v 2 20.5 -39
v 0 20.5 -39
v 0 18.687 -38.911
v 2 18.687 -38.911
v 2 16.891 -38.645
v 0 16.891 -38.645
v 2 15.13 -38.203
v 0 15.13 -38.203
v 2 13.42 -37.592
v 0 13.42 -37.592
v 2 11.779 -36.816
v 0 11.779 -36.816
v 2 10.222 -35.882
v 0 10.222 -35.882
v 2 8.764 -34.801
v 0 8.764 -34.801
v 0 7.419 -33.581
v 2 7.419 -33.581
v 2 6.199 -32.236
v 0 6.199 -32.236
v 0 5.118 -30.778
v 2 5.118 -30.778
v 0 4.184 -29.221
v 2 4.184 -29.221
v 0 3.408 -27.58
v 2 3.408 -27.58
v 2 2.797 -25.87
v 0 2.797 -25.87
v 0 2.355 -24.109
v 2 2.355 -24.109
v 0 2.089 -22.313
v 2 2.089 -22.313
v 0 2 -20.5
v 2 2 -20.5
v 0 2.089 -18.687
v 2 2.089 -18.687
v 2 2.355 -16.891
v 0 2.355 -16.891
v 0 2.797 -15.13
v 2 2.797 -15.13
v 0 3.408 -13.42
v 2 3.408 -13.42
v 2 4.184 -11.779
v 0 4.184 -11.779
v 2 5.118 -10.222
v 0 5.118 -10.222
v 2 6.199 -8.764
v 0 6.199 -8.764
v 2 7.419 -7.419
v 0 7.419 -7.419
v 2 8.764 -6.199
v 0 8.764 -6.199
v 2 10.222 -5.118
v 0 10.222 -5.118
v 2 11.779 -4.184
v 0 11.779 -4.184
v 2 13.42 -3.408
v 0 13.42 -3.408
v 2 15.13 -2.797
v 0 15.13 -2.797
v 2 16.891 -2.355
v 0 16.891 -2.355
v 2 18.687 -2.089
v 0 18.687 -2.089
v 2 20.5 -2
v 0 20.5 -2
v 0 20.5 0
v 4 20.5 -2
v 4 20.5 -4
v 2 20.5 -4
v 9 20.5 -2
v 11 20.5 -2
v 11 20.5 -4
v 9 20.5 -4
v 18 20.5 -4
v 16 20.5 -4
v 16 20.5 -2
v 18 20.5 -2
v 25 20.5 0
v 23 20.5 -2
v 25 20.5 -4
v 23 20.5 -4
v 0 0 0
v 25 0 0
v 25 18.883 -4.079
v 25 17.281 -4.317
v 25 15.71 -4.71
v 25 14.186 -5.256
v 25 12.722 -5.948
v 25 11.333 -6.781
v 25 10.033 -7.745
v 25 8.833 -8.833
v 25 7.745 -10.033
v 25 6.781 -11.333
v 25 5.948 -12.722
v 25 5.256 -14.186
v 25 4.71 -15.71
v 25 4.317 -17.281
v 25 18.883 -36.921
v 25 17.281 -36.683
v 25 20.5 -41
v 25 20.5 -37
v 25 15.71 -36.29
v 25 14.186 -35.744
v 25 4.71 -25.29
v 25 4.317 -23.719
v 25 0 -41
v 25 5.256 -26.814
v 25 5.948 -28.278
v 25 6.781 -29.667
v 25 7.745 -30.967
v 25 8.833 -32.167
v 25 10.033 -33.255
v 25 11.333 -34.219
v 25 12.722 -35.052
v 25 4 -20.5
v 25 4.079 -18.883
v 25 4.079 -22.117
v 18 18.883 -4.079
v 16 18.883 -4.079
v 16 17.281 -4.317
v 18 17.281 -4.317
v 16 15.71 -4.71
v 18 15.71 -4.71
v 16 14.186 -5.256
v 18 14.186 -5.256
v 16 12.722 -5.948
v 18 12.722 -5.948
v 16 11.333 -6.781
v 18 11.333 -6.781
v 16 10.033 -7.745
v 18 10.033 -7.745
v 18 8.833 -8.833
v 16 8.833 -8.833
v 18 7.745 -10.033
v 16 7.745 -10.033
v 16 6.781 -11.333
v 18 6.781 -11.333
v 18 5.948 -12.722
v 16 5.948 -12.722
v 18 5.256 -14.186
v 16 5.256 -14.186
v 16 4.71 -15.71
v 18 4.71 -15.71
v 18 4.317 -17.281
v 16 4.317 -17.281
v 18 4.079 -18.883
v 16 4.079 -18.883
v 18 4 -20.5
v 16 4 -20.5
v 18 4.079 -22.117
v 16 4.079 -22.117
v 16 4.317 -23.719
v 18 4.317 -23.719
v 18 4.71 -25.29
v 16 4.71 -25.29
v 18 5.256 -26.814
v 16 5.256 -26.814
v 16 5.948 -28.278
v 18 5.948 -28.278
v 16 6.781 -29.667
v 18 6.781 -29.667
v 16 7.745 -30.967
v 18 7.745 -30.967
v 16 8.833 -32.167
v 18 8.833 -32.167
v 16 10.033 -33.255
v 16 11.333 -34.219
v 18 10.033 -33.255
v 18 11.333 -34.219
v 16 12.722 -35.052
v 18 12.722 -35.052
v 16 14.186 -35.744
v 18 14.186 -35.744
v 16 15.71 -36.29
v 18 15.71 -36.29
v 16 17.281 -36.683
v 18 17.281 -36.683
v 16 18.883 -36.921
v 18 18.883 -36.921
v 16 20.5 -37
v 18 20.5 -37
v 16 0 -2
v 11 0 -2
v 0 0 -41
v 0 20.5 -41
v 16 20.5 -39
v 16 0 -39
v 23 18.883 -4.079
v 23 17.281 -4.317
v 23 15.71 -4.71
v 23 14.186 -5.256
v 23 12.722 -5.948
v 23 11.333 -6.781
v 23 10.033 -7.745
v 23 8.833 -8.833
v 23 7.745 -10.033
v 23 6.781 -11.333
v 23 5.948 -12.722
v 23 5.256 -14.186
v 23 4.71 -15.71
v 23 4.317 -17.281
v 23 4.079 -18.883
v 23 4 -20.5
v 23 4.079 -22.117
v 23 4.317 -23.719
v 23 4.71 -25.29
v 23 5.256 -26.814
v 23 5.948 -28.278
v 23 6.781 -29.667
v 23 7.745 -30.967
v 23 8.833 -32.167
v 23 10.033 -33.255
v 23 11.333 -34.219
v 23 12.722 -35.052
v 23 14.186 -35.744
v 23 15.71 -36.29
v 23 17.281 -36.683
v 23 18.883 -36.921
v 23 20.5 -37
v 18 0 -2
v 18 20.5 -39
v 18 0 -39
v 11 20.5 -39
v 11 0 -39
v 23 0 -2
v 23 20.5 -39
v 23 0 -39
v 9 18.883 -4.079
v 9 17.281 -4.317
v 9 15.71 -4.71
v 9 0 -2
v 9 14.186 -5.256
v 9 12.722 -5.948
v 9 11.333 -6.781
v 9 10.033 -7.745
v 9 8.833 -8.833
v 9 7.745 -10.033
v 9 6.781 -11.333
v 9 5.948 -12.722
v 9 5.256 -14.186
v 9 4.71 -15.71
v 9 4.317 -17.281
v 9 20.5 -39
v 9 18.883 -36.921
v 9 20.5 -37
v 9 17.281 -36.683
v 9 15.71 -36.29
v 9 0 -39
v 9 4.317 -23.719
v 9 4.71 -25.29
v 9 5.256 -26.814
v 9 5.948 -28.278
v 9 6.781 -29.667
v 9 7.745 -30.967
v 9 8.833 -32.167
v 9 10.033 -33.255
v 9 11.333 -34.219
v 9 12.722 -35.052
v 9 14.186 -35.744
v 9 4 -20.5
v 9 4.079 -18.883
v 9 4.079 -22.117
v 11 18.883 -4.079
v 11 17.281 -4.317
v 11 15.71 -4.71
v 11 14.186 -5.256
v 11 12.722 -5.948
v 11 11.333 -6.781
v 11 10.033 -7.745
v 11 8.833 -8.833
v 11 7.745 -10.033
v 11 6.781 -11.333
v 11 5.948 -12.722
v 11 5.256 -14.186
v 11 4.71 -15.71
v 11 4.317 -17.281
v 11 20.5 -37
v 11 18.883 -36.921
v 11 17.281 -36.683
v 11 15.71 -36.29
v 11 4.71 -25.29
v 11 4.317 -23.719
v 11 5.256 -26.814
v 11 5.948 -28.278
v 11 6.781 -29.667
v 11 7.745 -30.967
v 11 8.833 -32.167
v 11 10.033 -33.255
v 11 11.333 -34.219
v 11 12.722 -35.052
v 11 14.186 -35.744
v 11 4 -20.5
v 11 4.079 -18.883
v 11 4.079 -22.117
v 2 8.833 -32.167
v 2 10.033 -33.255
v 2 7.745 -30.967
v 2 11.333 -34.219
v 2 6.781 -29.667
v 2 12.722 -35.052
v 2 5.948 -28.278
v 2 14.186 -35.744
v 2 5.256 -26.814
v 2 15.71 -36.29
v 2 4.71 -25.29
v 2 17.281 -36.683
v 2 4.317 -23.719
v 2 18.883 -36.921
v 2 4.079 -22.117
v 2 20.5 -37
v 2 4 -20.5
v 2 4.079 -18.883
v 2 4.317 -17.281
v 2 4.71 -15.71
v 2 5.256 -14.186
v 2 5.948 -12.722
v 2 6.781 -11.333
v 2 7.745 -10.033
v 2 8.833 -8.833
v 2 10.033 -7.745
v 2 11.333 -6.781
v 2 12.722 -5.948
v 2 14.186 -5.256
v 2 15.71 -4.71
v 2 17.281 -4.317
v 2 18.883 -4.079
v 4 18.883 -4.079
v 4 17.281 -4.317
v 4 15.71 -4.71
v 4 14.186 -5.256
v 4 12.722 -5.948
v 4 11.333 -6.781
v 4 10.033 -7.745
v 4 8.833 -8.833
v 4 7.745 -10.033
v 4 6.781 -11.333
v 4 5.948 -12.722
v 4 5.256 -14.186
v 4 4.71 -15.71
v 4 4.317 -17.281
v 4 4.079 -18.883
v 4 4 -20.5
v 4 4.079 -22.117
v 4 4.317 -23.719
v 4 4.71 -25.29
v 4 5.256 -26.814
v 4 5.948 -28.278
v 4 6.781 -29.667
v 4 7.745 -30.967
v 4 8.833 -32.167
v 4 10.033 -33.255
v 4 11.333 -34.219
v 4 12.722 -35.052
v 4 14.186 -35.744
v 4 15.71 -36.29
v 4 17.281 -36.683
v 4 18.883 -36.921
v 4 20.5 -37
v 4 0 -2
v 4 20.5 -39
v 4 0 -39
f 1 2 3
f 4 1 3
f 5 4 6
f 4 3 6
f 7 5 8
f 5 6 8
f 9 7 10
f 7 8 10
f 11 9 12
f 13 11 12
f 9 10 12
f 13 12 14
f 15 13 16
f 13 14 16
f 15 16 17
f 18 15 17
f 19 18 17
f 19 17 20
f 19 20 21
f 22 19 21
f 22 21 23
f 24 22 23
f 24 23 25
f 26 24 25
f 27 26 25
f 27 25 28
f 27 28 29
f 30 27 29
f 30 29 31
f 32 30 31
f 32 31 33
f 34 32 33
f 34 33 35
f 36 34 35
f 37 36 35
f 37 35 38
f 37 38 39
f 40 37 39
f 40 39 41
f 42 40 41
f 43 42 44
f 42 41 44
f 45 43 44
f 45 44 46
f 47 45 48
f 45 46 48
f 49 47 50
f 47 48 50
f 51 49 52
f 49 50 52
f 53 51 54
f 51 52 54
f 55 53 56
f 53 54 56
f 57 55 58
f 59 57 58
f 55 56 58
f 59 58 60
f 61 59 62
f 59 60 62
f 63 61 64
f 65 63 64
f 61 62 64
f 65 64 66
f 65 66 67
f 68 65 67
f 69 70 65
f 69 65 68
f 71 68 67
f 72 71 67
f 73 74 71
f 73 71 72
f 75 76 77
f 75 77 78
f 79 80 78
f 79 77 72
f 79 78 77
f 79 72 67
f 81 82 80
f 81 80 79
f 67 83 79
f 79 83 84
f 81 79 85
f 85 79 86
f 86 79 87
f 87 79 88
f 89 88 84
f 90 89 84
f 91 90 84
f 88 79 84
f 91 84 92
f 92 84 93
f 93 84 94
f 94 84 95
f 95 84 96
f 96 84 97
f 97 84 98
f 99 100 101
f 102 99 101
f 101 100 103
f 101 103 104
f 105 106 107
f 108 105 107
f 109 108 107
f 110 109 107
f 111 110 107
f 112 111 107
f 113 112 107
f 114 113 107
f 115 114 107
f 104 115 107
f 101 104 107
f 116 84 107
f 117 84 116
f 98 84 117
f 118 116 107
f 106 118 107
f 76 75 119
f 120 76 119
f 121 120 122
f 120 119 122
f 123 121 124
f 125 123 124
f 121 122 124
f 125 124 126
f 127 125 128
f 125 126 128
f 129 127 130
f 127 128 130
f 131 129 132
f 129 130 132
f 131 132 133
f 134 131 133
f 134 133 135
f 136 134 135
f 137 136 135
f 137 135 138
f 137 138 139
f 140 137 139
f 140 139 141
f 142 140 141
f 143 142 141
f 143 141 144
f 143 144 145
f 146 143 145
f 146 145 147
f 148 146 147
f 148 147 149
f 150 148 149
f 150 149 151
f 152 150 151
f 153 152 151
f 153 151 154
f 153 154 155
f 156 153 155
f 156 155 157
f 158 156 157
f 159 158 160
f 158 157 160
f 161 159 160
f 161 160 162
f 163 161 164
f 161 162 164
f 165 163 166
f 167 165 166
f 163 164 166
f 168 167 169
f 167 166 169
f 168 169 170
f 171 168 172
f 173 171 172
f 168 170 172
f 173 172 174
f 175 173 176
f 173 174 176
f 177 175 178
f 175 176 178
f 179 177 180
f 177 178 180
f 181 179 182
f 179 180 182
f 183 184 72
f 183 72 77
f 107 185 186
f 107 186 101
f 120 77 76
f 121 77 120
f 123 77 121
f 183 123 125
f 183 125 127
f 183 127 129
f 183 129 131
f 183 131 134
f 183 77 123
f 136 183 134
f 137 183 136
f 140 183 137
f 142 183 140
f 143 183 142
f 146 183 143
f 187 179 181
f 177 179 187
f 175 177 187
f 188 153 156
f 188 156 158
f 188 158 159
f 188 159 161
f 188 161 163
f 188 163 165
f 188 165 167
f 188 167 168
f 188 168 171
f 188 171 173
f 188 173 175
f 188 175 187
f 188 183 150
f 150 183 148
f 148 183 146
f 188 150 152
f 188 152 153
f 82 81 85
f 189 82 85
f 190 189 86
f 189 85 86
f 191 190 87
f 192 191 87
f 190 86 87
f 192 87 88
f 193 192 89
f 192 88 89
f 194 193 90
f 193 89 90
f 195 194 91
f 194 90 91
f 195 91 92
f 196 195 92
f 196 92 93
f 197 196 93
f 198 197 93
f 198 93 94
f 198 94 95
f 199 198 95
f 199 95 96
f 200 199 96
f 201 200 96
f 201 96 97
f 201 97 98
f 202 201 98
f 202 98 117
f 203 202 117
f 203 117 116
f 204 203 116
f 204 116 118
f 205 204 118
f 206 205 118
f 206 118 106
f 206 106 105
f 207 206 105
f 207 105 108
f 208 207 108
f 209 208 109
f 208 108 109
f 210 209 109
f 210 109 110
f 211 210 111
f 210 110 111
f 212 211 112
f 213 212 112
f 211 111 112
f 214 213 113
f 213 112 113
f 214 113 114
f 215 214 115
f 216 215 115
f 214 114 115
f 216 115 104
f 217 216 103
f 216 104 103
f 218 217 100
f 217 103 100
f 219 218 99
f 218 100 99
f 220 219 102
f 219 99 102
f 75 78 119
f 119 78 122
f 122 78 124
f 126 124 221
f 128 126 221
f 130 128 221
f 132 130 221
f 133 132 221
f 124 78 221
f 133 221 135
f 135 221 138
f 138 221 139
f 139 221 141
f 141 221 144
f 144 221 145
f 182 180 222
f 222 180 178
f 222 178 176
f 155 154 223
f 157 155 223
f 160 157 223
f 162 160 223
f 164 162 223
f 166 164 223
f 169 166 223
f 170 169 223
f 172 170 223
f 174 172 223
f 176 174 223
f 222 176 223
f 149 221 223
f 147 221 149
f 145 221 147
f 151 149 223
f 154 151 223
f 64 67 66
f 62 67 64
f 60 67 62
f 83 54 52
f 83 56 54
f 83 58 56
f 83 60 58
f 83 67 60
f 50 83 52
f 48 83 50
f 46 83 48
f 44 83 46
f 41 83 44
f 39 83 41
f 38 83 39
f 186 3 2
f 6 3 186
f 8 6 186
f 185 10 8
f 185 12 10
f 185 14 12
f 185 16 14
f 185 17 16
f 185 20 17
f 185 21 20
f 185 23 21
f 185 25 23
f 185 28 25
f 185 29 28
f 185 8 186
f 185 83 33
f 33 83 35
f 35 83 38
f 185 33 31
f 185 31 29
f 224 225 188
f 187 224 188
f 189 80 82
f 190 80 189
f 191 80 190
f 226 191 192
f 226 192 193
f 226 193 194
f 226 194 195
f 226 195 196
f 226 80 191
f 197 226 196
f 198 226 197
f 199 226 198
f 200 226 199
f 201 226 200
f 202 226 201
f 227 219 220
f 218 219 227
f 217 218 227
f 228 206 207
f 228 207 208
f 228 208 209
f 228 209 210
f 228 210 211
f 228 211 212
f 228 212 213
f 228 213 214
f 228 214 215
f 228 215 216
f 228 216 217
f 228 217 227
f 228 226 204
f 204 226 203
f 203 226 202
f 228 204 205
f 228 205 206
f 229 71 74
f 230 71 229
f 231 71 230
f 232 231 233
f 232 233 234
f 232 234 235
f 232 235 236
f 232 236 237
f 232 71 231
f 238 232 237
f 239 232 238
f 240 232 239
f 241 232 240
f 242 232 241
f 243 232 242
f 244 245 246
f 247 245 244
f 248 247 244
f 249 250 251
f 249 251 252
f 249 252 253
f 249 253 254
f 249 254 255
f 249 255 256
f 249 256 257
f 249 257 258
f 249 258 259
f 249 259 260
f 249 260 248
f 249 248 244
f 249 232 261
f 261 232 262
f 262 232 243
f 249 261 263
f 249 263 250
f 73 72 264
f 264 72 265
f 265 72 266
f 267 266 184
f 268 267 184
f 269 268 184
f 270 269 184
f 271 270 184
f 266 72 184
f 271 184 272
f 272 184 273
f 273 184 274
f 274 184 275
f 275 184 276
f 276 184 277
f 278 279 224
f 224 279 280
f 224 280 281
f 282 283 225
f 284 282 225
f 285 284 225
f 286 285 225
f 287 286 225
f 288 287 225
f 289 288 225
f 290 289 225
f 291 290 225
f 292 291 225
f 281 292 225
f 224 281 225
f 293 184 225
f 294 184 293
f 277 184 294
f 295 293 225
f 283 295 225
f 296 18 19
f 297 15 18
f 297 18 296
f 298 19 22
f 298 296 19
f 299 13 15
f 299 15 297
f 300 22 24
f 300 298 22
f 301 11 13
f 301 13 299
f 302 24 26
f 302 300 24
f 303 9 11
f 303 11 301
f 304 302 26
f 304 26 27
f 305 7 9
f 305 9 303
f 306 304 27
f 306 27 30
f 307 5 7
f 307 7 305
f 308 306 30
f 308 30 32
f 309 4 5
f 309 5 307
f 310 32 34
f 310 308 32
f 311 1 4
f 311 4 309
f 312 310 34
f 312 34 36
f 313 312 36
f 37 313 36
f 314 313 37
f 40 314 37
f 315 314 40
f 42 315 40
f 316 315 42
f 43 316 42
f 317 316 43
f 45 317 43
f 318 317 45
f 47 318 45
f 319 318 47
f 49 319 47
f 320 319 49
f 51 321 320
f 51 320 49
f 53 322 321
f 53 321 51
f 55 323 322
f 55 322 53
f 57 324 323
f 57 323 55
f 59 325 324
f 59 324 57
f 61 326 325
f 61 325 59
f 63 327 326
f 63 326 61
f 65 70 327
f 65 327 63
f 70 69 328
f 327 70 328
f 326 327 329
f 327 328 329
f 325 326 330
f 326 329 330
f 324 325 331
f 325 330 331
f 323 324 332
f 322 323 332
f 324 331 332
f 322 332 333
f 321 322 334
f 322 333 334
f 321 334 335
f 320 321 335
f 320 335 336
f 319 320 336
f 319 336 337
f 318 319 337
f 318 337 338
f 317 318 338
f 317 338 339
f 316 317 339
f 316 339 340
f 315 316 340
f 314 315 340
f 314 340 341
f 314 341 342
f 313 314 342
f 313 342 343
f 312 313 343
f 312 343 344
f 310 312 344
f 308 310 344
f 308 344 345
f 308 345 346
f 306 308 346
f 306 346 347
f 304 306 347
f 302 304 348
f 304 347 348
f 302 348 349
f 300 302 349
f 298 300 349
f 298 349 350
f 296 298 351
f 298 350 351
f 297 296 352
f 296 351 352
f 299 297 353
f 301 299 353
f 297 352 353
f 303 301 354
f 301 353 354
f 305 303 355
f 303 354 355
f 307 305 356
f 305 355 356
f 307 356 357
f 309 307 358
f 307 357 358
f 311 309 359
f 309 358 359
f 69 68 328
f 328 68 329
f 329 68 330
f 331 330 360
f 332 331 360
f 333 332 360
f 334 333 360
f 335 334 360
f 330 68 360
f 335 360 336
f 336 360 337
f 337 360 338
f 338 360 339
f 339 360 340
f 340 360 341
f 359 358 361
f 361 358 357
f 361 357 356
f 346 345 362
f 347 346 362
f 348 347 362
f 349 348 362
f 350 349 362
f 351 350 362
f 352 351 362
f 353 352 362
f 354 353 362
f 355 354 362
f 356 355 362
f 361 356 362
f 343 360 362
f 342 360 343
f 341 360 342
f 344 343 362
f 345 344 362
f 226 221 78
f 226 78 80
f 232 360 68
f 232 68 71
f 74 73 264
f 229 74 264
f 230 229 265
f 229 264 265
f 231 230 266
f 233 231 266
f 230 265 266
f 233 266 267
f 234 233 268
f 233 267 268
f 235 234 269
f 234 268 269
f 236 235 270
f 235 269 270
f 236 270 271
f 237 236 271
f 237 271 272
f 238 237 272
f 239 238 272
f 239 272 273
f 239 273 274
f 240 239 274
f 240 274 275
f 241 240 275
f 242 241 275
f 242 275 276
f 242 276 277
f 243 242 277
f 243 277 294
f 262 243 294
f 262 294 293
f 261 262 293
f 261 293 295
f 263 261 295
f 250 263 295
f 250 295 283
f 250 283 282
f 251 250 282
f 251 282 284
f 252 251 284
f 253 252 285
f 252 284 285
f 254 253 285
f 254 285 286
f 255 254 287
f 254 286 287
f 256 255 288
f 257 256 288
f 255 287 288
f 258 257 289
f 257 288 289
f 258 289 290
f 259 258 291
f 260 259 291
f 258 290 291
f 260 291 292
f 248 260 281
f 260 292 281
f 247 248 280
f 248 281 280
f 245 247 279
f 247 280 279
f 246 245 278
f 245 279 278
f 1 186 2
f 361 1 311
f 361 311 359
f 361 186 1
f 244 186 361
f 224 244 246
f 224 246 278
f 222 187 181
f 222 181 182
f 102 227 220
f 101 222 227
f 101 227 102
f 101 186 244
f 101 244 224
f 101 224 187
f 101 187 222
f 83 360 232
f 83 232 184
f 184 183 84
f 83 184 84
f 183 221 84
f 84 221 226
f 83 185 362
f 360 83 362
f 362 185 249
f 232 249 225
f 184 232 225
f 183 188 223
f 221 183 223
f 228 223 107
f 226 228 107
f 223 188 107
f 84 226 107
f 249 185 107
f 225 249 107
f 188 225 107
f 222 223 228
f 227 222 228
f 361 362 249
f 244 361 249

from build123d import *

# Parameters (mm, degrees)
SKETCH_1_W             = 25
SKETCH_1_H             = 41
EXTRUDE_415_DEPTH      = 2
SKETCH_5_W             = 25
SKETCH_5_H             = 2
EXTRUDE_624_DEPTH      = 18.5
SKETCH_7_W             = 4
SKETCH_7_H             = 37
SKETCH_7_W_2           = 2
EXTRUDE_1265_DEPTH     = 18.5
SKETCH_8_R             = 18.5
CUT_EXTRUDE_1405_DEPTH = 2
SKETCH_9_R             = 16.5
CUT_EXTRUDE_1536_DEPTH = 23
SKETCH_10_W            = 5
SKETCH_10_H            = 37
CUT_EXTRUDE_1762_DEPTH = 2


with BuildPart() as part:
    # 草图1 → Extrude 415 (new body)
    with BuildSketch(Plane(origin=(0, 0, 0), x_dir=(1, 0, 0), z_dir=(0, 1, 0))):
        with Locations((12.5, 20.5)):
            Rectangle(SKETCH_1_W, SKETCH_1_H)
    extrude(amount=EXTRUDE_415_DEPTH)

    # 草图5 → Extrude 624 (add)
    with BuildSketch(Plane(origin=(0, 2, 0), x_dir=(1, 0, 0), z_dir=(0, 1, 0))):
        with Locations((12.5, 40)):
            Rectangle(SKETCH_5_W, SKETCH_5_H)
        with Locations((12.5, 1)):
            Rectangle(SKETCH_5_W, SKETCH_5_H)
    extrude(amount=EXTRUDE_624_DEPTH)

    # 草图7 → Extrude 1265 (add)
    with BuildSketch(Plane(origin=(0, 2, 0), x_dir=(1, 0, 0), z_dir=(0, 1, 0))):
        with Locations((2, 20.5)):
            Rectangle(SKETCH_7_W, SKETCH_7_H)
        with Locations((10, 20.5)):
            Rectangle(SKETCH_7_W_2, SKETCH_7_H)
        with Locations((17, 20.5)):
            Rectangle(SKETCH_7_W_2, SKETCH_7_H)
        with Locations((24, 20.5)):
            Rectangle(SKETCH_7_W_2, SKETCH_7_H)
    extrude(amount=EXTRUDE_1265_DEPTH)

    # 草图8 → Cut-Extrude 1405 (cut)
    with BuildSketch(Plane.ZY):
        with Locations((-20.5, 20.5)):
            Circle(SKETCH_8_R)
    extrude(amount=-CUT_EXTRUDE_1405_DEPTH, mode=Mode.SUBTRACT)

    # 草图9 → Cut-Extrude 1536 (cut)
    with BuildSketch(Plane(origin=(25, 0, 0), x_dir=(0, 0, -1), z_dir=(1, 0, 0))):
        with Locations((20.5, 20.5)):
            Circle(SKETCH_9_R)
    extrude(amount=-CUT_EXTRUDE_1536_DEPTH, mode=Mode.SUBTRACT)

    # 草图10 → Cut-Extrude 1762 (cut)
    with BuildSketch(Plane(origin=(0, 2, 0), x_dir=(1, 0, 0), z_dir=(0, 1, 0))):
        with Locations((6.5, 20.5)):
            Rectangle(SKETCH_10_W, SKETCH_10_H)
        with Locations((13.5, 20.5)):
            Rectangle(SKETCH_10_W, SKETCH_10_H)
        with Locations((20.5, 20.5)):
            Rectangle(SKETCH_10_W, SKETCH_10_H)
    extrude(amount=-CUT_EXTRUDE_1762_DEPTH, mode=Mode.SUBTRACT)


solid = part.part
